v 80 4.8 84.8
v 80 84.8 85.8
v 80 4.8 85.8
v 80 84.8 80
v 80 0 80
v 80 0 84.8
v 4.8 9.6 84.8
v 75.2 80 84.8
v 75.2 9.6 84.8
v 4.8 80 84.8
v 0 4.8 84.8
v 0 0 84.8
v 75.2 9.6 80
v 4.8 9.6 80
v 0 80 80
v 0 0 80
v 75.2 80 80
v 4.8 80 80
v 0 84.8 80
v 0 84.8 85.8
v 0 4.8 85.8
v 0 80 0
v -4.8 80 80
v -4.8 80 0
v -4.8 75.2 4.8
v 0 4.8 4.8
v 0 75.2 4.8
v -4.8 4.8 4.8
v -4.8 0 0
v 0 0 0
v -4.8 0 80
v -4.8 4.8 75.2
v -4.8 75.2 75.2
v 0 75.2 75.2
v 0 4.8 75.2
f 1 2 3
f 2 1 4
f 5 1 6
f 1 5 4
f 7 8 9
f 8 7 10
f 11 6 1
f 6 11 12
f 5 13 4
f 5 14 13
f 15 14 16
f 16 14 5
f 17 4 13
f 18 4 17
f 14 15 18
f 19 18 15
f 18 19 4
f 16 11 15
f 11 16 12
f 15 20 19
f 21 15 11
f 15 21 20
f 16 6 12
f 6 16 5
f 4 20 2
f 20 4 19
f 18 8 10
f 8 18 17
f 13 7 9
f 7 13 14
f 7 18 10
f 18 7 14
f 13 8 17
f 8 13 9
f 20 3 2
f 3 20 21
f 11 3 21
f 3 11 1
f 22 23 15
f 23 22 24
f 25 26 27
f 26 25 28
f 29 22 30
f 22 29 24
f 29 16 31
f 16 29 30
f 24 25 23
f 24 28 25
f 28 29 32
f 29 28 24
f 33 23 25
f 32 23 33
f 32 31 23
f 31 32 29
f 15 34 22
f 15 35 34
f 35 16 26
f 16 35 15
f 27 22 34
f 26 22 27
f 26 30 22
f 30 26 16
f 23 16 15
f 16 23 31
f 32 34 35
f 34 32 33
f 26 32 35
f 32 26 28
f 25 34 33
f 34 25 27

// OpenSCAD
// file: materials.scad
module twobyfour(length) {
    echo("2x4: ", length);
    color("BurlyWood")
    cube([length, 4.8, 9.8]);   
}

module twobytwo(length) {
    echo("2x2: ", length);
    color("BurlyWood")
    cube([length, 4.8, 4.8]);   
}
// main file
use <materials.scad>;



translate([0, 0, 80]) {
    twobytwo(80);
    translate([0, 80, 0])
        twobytwo(80);

    translate([0, 4.8, 0])
        twobytwo(80);

    translate([4.8, 9.6, 0])
        rotate(90)
        twobytwo(80 - 9.6);

    translate([80, 9.6, 0])
        rotate(90)
        twobytwo(80 - 9.6);

    translate([0, 4.8, 4.8])
    cube([80, 80, 1]);  
}

rotate([0, 0, 90]) {
    twobytwo(80);

    translate([0, 0, 80 - 4.8])
        twobytwo(80);

    translate([0, 0, 80 - 4.8])
        rotate([0, 90, 0])
        twobytwo(80 - 9.6);

    translate([80 - 4.8, 0, 80 - 4.8])
        rotate([0, 90, 0])
        twobytwo(80 - 9.6);
}
